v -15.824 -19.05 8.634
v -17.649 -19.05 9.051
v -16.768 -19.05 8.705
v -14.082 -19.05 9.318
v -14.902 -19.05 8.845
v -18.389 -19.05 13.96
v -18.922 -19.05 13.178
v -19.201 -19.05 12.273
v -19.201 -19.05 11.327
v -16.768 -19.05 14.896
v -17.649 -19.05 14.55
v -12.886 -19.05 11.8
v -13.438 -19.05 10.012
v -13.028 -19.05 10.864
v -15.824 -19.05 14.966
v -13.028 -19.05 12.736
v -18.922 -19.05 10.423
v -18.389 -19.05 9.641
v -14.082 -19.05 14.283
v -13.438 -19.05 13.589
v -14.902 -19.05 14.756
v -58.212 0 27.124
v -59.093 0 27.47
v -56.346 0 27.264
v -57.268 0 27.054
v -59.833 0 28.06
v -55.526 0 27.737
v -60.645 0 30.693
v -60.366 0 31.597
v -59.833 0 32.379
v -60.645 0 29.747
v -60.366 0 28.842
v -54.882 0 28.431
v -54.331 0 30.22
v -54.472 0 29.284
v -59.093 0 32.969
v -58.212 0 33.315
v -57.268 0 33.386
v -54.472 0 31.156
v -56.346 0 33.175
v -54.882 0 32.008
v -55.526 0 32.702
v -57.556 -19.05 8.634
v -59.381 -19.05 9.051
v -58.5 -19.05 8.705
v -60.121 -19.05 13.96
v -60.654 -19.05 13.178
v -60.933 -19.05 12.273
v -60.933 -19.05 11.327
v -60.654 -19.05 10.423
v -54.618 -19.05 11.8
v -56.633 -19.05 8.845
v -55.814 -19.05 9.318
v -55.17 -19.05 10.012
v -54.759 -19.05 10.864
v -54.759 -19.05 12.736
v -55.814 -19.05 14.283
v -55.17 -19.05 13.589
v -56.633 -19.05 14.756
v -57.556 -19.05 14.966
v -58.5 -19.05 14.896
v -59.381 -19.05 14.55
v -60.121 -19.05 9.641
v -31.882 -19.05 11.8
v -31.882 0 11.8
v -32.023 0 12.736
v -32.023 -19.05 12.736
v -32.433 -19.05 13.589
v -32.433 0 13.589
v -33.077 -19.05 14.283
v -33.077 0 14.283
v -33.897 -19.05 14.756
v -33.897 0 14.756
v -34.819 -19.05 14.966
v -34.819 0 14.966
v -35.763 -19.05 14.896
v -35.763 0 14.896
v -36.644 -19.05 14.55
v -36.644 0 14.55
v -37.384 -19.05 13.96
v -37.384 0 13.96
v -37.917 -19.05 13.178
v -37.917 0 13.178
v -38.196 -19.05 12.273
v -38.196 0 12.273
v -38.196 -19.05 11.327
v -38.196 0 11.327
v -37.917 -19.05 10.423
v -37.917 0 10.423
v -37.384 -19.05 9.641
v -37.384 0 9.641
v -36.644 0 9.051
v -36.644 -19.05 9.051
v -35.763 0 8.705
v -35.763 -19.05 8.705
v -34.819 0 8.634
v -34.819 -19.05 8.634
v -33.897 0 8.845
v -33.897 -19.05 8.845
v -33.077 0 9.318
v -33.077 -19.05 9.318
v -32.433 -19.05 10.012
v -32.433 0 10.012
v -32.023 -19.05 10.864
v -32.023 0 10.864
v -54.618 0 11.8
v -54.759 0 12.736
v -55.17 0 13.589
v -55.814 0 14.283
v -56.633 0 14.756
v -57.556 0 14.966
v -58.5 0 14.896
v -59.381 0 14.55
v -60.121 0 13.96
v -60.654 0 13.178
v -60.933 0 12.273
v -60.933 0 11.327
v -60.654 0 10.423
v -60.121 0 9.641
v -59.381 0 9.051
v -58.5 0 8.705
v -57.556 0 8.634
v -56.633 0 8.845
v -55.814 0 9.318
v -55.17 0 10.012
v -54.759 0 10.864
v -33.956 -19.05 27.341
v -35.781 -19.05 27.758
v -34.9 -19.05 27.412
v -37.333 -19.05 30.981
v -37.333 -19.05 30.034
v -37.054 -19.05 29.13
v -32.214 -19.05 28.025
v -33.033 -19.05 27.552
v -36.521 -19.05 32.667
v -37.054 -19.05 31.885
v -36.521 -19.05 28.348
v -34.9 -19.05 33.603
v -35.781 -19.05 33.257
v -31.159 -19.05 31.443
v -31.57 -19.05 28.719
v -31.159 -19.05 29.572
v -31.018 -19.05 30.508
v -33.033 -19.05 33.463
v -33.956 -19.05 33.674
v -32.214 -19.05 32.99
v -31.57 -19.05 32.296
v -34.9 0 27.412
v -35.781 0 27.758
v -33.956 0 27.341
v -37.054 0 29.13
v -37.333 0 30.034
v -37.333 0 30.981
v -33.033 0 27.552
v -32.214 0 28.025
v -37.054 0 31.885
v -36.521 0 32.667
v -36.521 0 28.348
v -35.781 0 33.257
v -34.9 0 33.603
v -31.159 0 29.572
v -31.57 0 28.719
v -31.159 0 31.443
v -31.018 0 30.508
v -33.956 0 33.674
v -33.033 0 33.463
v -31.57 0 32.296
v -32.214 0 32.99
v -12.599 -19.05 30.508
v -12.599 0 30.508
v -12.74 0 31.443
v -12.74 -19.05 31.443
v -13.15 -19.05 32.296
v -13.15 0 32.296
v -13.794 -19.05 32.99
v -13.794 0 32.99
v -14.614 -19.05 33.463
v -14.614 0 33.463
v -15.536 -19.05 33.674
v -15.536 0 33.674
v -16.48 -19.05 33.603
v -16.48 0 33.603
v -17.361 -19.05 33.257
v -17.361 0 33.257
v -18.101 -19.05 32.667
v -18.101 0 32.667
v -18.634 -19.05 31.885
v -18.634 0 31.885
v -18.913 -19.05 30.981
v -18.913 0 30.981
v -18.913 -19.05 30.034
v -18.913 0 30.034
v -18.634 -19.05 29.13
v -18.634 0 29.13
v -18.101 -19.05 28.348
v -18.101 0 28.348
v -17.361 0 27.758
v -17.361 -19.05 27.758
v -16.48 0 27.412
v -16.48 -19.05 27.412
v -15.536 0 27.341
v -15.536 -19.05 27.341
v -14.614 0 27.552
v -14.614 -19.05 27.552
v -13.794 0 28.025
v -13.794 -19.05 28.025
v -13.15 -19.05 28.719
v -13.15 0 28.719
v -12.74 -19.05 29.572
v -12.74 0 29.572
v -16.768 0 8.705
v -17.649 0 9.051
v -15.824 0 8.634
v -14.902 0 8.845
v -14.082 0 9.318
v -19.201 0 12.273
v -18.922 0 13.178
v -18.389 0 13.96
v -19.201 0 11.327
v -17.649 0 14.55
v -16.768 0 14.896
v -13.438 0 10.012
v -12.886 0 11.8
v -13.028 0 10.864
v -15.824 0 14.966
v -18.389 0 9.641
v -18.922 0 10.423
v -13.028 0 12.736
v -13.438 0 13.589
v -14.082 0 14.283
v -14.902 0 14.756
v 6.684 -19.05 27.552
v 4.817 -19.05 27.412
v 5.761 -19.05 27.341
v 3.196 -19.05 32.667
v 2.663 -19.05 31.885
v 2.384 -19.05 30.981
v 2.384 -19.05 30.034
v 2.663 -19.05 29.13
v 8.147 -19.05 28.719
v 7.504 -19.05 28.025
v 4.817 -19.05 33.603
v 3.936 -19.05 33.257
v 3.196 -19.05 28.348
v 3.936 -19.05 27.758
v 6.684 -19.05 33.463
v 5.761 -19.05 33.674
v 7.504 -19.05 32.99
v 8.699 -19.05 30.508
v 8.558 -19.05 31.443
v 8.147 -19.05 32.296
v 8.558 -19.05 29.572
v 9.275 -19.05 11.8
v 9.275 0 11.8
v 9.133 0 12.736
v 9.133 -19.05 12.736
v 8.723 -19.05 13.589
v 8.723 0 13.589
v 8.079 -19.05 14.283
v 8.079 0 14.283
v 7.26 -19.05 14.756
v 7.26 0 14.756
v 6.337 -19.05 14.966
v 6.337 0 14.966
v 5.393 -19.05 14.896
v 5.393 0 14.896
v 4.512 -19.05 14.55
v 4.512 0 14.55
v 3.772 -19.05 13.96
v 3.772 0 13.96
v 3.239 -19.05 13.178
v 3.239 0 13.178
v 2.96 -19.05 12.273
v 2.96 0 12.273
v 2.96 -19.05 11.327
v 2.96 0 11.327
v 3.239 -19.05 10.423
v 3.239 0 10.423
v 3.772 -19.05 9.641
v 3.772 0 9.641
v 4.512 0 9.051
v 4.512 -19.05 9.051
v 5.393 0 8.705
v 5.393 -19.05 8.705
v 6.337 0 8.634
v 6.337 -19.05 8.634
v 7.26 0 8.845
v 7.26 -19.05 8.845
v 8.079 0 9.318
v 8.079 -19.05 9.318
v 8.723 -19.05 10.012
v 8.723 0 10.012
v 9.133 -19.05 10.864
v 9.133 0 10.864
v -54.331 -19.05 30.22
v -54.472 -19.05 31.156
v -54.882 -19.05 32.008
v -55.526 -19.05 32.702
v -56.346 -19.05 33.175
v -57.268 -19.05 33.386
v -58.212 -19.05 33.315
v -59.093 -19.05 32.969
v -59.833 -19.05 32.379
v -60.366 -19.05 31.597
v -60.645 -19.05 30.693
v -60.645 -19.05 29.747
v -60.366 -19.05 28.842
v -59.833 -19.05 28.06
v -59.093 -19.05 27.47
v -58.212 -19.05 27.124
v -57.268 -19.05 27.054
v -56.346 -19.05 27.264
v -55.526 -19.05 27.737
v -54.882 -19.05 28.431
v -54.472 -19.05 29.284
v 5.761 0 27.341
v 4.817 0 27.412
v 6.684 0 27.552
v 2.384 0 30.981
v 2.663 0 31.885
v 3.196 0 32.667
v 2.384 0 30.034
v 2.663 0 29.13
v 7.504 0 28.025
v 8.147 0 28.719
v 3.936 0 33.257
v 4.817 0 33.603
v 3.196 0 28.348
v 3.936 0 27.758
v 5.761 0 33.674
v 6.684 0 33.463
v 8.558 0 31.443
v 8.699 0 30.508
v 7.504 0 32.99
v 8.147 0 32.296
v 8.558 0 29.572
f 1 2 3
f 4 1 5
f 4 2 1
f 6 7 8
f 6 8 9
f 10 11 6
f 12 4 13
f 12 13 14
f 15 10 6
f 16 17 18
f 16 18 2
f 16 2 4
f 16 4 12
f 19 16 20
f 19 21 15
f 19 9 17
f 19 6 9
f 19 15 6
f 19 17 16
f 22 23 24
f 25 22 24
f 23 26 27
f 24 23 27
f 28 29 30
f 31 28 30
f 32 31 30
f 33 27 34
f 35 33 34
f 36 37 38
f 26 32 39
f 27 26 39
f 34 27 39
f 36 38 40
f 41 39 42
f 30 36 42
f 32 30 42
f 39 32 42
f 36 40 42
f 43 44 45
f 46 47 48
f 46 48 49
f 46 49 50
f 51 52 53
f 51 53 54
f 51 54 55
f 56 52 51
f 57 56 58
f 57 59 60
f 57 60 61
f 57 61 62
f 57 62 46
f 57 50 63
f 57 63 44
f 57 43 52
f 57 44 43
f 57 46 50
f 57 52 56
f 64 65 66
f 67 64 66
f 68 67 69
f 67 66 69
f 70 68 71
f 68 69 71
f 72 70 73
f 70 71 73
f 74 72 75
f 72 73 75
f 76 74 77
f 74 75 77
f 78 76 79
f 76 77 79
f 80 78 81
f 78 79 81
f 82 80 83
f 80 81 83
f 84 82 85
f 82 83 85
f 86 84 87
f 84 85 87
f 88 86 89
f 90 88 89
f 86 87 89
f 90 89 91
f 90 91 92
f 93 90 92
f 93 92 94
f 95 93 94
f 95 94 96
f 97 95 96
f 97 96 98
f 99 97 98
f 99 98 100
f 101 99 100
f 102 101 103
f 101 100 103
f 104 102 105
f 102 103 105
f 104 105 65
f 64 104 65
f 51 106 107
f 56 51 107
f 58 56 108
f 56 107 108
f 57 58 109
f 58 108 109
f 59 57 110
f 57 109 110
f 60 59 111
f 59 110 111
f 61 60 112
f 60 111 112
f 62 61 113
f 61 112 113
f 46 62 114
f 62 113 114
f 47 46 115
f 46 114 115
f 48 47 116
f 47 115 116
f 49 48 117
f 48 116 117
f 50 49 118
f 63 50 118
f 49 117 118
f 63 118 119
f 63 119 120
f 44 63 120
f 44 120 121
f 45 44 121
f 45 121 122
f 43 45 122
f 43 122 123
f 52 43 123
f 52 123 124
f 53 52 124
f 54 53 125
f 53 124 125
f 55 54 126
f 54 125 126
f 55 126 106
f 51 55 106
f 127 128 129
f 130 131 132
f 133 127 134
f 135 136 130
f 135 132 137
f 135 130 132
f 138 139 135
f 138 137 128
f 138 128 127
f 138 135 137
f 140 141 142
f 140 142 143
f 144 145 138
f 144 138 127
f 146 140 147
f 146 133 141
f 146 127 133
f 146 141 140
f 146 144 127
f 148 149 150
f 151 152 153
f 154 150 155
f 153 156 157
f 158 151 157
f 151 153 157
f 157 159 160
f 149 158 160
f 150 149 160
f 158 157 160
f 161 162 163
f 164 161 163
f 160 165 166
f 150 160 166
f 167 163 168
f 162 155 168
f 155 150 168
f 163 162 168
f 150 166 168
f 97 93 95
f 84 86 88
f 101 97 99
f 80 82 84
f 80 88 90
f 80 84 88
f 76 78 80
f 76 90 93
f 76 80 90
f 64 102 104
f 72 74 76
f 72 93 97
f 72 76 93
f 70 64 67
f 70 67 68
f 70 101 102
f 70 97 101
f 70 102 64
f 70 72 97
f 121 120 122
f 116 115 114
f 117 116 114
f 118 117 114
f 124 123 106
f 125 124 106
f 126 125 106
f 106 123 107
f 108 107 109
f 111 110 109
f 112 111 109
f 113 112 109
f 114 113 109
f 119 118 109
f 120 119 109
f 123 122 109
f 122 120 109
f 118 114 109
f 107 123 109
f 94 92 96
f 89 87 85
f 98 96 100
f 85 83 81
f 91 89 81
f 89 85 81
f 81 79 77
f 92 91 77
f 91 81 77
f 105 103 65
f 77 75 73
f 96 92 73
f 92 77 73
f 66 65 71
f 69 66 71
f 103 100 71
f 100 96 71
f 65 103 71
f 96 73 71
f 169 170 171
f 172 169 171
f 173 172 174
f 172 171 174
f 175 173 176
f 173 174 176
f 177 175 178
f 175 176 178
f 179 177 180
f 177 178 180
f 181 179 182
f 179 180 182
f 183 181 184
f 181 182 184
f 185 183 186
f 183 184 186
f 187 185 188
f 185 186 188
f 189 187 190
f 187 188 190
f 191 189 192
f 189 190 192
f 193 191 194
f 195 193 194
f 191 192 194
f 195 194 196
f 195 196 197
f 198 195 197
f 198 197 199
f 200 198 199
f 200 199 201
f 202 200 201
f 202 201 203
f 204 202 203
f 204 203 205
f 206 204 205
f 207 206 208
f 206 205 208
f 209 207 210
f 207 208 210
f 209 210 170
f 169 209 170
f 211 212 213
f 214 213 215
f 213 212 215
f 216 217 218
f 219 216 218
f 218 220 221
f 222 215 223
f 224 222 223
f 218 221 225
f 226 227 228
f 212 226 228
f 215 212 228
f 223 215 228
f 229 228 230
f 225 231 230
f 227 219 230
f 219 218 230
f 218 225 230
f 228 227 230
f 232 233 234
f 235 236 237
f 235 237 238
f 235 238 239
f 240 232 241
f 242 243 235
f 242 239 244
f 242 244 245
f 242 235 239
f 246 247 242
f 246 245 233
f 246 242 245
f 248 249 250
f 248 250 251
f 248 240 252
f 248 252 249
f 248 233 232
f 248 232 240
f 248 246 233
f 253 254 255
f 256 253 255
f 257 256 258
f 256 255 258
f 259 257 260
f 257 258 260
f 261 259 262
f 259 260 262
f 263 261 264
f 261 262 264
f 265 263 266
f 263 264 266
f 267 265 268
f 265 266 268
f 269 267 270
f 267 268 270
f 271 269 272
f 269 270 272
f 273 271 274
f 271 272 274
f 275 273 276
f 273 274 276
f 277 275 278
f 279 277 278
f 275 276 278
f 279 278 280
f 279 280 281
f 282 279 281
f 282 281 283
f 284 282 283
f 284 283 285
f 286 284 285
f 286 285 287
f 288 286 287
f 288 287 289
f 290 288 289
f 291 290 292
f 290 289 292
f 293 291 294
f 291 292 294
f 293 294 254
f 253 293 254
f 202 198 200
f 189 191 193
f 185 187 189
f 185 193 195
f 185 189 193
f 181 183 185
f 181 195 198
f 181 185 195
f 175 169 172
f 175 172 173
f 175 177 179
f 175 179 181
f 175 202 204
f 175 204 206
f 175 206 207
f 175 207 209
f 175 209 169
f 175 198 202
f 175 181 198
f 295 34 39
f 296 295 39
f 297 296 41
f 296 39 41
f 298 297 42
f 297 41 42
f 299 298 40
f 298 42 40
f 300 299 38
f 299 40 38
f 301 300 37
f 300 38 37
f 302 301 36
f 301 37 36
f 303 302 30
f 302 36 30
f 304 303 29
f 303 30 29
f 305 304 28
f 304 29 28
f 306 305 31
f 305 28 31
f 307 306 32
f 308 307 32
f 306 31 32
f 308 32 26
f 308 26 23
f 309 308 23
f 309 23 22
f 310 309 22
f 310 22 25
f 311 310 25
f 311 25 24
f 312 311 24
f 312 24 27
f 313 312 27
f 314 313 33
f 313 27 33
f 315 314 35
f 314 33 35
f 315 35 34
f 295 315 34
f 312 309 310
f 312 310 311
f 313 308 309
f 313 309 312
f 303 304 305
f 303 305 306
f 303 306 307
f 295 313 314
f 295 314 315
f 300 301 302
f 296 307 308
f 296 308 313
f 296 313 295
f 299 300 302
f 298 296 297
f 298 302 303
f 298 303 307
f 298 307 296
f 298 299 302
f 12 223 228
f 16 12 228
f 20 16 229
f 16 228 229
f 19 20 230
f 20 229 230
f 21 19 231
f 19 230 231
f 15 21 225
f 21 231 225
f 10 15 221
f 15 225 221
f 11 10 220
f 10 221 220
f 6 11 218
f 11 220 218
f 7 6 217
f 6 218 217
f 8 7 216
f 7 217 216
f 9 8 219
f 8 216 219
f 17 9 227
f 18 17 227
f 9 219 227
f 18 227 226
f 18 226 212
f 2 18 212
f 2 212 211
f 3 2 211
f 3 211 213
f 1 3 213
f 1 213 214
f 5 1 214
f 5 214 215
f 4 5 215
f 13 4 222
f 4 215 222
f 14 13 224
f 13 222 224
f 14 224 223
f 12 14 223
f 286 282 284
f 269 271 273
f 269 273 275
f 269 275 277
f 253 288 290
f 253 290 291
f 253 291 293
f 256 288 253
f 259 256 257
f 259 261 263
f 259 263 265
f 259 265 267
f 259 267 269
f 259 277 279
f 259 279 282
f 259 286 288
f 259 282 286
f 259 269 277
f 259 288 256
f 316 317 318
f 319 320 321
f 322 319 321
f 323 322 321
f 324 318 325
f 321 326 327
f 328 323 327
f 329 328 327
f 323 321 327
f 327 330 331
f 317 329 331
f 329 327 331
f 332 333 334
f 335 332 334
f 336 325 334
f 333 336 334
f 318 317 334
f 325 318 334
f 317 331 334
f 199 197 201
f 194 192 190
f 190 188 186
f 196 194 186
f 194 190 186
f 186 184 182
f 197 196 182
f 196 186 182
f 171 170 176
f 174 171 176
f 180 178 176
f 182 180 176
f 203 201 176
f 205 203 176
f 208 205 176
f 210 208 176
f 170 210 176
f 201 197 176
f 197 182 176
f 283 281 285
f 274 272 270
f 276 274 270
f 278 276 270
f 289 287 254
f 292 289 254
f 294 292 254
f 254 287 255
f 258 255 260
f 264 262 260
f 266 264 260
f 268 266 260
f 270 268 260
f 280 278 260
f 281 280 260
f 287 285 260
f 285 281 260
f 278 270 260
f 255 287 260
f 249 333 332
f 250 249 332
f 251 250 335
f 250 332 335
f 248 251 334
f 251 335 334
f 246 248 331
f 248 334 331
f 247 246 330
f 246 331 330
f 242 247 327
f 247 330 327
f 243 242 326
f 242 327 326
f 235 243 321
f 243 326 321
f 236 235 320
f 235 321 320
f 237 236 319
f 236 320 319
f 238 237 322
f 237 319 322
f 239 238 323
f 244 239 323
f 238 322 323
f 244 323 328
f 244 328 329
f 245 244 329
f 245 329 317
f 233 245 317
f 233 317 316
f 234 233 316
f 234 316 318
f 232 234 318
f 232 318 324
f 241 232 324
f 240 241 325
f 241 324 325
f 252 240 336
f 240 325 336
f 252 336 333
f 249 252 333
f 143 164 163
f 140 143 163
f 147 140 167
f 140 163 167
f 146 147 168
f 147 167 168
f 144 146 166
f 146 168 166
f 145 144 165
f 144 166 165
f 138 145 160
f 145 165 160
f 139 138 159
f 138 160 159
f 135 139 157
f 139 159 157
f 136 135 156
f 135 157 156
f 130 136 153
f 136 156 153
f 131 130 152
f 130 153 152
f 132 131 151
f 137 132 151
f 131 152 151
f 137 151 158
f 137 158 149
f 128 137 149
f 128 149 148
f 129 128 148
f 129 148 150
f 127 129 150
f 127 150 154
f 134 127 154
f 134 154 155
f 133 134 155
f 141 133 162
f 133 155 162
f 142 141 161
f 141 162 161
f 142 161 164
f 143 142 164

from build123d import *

# Parameters (mm, degrees)
F0_R     = 3.175
F1_DEPTH = 19.05


# Not quite as in the source:
# - a length typed as a fraction of an inch, garbled in the dataset ("3 / 203.2 mm" for 3/8 in), is restored


with BuildPart() as f1:
    # F0 (on Front) → F1 (new body)
    with BuildSketch(Plane.XZ):
        with Locations((-57.5055219233, 30.2197728306)):
            Circle(F0_R)
    extrude(amount=F1_DEPTH)


with BuildPart() as f1b:
    # F0 (on Front) → F1, piece 2 (new body)
    with BuildSketch(Plane.XZ):
        with Locations((-34.1932550073, 30.5075775832)):
            Circle(F0_R)
    extrude(amount=F1_DEPTH)


with BuildPart() as f1c:
    # F0 (on Front) → F1, piece 3 (new body)
    with BuildSketch(Plane.XZ):
        with Locations((-15.7736875117, 30.5075775832)):
            Circle(F0_R)
    extrude(amount=F1_DEPTH)


with BuildPart() as f1d:
    # F0 (on Front) → F1, piece 4 (new body)
    with BuildSketch(Plane.XZ):
        with Locations((5.5239372887, 30.5075775832)):
            Circle(F0_R)
    extrude(amount=F1_DEPTH)


with BuildPart() as f1e:
    # F0 (on Front) → F1, piece 5 (new body)
    with BuildSketch(Plane.XZ):
        with Locations((6.0995486565, 11.8002044037)):
            Circle(F0_R)
    extrude(amount=F1_DEPTH)


with BuildPart() as f1f:
    # F0 (on Front) → F1, piece 6 (new body)
    with BuildSketch(Plane.XZ):
        with Locations((-16.0614941269, 11.8002044037)):
            Circle(F0_R)
    extrude(amount=F1_DEPTH)


with BuildPart() as f1g:
    # F0 (on Front) → F1, piece 7 (new body)
    with BuildSketch(Plane.XZ):
        with Locations((-35.0566729903, 11.8002044037)):
            Circle(F0_R)
    extrude(amount=F1_DEPTH)


with BuildPart() as f1h:
    # F0 (on Front) → F1, piece 8 (new body)
    with BuildSketch(Plane.XZ):
        with Locations((-57.7933304012, 11.8002044037)):
            Circle(F0_R)
    extrude(amount=F1_DEPTH)


solid = Compound([f1.part, f1b.part, f1c.part, f1d.part, f1e.part, f1f.part, f1g.part, f1h.part])
